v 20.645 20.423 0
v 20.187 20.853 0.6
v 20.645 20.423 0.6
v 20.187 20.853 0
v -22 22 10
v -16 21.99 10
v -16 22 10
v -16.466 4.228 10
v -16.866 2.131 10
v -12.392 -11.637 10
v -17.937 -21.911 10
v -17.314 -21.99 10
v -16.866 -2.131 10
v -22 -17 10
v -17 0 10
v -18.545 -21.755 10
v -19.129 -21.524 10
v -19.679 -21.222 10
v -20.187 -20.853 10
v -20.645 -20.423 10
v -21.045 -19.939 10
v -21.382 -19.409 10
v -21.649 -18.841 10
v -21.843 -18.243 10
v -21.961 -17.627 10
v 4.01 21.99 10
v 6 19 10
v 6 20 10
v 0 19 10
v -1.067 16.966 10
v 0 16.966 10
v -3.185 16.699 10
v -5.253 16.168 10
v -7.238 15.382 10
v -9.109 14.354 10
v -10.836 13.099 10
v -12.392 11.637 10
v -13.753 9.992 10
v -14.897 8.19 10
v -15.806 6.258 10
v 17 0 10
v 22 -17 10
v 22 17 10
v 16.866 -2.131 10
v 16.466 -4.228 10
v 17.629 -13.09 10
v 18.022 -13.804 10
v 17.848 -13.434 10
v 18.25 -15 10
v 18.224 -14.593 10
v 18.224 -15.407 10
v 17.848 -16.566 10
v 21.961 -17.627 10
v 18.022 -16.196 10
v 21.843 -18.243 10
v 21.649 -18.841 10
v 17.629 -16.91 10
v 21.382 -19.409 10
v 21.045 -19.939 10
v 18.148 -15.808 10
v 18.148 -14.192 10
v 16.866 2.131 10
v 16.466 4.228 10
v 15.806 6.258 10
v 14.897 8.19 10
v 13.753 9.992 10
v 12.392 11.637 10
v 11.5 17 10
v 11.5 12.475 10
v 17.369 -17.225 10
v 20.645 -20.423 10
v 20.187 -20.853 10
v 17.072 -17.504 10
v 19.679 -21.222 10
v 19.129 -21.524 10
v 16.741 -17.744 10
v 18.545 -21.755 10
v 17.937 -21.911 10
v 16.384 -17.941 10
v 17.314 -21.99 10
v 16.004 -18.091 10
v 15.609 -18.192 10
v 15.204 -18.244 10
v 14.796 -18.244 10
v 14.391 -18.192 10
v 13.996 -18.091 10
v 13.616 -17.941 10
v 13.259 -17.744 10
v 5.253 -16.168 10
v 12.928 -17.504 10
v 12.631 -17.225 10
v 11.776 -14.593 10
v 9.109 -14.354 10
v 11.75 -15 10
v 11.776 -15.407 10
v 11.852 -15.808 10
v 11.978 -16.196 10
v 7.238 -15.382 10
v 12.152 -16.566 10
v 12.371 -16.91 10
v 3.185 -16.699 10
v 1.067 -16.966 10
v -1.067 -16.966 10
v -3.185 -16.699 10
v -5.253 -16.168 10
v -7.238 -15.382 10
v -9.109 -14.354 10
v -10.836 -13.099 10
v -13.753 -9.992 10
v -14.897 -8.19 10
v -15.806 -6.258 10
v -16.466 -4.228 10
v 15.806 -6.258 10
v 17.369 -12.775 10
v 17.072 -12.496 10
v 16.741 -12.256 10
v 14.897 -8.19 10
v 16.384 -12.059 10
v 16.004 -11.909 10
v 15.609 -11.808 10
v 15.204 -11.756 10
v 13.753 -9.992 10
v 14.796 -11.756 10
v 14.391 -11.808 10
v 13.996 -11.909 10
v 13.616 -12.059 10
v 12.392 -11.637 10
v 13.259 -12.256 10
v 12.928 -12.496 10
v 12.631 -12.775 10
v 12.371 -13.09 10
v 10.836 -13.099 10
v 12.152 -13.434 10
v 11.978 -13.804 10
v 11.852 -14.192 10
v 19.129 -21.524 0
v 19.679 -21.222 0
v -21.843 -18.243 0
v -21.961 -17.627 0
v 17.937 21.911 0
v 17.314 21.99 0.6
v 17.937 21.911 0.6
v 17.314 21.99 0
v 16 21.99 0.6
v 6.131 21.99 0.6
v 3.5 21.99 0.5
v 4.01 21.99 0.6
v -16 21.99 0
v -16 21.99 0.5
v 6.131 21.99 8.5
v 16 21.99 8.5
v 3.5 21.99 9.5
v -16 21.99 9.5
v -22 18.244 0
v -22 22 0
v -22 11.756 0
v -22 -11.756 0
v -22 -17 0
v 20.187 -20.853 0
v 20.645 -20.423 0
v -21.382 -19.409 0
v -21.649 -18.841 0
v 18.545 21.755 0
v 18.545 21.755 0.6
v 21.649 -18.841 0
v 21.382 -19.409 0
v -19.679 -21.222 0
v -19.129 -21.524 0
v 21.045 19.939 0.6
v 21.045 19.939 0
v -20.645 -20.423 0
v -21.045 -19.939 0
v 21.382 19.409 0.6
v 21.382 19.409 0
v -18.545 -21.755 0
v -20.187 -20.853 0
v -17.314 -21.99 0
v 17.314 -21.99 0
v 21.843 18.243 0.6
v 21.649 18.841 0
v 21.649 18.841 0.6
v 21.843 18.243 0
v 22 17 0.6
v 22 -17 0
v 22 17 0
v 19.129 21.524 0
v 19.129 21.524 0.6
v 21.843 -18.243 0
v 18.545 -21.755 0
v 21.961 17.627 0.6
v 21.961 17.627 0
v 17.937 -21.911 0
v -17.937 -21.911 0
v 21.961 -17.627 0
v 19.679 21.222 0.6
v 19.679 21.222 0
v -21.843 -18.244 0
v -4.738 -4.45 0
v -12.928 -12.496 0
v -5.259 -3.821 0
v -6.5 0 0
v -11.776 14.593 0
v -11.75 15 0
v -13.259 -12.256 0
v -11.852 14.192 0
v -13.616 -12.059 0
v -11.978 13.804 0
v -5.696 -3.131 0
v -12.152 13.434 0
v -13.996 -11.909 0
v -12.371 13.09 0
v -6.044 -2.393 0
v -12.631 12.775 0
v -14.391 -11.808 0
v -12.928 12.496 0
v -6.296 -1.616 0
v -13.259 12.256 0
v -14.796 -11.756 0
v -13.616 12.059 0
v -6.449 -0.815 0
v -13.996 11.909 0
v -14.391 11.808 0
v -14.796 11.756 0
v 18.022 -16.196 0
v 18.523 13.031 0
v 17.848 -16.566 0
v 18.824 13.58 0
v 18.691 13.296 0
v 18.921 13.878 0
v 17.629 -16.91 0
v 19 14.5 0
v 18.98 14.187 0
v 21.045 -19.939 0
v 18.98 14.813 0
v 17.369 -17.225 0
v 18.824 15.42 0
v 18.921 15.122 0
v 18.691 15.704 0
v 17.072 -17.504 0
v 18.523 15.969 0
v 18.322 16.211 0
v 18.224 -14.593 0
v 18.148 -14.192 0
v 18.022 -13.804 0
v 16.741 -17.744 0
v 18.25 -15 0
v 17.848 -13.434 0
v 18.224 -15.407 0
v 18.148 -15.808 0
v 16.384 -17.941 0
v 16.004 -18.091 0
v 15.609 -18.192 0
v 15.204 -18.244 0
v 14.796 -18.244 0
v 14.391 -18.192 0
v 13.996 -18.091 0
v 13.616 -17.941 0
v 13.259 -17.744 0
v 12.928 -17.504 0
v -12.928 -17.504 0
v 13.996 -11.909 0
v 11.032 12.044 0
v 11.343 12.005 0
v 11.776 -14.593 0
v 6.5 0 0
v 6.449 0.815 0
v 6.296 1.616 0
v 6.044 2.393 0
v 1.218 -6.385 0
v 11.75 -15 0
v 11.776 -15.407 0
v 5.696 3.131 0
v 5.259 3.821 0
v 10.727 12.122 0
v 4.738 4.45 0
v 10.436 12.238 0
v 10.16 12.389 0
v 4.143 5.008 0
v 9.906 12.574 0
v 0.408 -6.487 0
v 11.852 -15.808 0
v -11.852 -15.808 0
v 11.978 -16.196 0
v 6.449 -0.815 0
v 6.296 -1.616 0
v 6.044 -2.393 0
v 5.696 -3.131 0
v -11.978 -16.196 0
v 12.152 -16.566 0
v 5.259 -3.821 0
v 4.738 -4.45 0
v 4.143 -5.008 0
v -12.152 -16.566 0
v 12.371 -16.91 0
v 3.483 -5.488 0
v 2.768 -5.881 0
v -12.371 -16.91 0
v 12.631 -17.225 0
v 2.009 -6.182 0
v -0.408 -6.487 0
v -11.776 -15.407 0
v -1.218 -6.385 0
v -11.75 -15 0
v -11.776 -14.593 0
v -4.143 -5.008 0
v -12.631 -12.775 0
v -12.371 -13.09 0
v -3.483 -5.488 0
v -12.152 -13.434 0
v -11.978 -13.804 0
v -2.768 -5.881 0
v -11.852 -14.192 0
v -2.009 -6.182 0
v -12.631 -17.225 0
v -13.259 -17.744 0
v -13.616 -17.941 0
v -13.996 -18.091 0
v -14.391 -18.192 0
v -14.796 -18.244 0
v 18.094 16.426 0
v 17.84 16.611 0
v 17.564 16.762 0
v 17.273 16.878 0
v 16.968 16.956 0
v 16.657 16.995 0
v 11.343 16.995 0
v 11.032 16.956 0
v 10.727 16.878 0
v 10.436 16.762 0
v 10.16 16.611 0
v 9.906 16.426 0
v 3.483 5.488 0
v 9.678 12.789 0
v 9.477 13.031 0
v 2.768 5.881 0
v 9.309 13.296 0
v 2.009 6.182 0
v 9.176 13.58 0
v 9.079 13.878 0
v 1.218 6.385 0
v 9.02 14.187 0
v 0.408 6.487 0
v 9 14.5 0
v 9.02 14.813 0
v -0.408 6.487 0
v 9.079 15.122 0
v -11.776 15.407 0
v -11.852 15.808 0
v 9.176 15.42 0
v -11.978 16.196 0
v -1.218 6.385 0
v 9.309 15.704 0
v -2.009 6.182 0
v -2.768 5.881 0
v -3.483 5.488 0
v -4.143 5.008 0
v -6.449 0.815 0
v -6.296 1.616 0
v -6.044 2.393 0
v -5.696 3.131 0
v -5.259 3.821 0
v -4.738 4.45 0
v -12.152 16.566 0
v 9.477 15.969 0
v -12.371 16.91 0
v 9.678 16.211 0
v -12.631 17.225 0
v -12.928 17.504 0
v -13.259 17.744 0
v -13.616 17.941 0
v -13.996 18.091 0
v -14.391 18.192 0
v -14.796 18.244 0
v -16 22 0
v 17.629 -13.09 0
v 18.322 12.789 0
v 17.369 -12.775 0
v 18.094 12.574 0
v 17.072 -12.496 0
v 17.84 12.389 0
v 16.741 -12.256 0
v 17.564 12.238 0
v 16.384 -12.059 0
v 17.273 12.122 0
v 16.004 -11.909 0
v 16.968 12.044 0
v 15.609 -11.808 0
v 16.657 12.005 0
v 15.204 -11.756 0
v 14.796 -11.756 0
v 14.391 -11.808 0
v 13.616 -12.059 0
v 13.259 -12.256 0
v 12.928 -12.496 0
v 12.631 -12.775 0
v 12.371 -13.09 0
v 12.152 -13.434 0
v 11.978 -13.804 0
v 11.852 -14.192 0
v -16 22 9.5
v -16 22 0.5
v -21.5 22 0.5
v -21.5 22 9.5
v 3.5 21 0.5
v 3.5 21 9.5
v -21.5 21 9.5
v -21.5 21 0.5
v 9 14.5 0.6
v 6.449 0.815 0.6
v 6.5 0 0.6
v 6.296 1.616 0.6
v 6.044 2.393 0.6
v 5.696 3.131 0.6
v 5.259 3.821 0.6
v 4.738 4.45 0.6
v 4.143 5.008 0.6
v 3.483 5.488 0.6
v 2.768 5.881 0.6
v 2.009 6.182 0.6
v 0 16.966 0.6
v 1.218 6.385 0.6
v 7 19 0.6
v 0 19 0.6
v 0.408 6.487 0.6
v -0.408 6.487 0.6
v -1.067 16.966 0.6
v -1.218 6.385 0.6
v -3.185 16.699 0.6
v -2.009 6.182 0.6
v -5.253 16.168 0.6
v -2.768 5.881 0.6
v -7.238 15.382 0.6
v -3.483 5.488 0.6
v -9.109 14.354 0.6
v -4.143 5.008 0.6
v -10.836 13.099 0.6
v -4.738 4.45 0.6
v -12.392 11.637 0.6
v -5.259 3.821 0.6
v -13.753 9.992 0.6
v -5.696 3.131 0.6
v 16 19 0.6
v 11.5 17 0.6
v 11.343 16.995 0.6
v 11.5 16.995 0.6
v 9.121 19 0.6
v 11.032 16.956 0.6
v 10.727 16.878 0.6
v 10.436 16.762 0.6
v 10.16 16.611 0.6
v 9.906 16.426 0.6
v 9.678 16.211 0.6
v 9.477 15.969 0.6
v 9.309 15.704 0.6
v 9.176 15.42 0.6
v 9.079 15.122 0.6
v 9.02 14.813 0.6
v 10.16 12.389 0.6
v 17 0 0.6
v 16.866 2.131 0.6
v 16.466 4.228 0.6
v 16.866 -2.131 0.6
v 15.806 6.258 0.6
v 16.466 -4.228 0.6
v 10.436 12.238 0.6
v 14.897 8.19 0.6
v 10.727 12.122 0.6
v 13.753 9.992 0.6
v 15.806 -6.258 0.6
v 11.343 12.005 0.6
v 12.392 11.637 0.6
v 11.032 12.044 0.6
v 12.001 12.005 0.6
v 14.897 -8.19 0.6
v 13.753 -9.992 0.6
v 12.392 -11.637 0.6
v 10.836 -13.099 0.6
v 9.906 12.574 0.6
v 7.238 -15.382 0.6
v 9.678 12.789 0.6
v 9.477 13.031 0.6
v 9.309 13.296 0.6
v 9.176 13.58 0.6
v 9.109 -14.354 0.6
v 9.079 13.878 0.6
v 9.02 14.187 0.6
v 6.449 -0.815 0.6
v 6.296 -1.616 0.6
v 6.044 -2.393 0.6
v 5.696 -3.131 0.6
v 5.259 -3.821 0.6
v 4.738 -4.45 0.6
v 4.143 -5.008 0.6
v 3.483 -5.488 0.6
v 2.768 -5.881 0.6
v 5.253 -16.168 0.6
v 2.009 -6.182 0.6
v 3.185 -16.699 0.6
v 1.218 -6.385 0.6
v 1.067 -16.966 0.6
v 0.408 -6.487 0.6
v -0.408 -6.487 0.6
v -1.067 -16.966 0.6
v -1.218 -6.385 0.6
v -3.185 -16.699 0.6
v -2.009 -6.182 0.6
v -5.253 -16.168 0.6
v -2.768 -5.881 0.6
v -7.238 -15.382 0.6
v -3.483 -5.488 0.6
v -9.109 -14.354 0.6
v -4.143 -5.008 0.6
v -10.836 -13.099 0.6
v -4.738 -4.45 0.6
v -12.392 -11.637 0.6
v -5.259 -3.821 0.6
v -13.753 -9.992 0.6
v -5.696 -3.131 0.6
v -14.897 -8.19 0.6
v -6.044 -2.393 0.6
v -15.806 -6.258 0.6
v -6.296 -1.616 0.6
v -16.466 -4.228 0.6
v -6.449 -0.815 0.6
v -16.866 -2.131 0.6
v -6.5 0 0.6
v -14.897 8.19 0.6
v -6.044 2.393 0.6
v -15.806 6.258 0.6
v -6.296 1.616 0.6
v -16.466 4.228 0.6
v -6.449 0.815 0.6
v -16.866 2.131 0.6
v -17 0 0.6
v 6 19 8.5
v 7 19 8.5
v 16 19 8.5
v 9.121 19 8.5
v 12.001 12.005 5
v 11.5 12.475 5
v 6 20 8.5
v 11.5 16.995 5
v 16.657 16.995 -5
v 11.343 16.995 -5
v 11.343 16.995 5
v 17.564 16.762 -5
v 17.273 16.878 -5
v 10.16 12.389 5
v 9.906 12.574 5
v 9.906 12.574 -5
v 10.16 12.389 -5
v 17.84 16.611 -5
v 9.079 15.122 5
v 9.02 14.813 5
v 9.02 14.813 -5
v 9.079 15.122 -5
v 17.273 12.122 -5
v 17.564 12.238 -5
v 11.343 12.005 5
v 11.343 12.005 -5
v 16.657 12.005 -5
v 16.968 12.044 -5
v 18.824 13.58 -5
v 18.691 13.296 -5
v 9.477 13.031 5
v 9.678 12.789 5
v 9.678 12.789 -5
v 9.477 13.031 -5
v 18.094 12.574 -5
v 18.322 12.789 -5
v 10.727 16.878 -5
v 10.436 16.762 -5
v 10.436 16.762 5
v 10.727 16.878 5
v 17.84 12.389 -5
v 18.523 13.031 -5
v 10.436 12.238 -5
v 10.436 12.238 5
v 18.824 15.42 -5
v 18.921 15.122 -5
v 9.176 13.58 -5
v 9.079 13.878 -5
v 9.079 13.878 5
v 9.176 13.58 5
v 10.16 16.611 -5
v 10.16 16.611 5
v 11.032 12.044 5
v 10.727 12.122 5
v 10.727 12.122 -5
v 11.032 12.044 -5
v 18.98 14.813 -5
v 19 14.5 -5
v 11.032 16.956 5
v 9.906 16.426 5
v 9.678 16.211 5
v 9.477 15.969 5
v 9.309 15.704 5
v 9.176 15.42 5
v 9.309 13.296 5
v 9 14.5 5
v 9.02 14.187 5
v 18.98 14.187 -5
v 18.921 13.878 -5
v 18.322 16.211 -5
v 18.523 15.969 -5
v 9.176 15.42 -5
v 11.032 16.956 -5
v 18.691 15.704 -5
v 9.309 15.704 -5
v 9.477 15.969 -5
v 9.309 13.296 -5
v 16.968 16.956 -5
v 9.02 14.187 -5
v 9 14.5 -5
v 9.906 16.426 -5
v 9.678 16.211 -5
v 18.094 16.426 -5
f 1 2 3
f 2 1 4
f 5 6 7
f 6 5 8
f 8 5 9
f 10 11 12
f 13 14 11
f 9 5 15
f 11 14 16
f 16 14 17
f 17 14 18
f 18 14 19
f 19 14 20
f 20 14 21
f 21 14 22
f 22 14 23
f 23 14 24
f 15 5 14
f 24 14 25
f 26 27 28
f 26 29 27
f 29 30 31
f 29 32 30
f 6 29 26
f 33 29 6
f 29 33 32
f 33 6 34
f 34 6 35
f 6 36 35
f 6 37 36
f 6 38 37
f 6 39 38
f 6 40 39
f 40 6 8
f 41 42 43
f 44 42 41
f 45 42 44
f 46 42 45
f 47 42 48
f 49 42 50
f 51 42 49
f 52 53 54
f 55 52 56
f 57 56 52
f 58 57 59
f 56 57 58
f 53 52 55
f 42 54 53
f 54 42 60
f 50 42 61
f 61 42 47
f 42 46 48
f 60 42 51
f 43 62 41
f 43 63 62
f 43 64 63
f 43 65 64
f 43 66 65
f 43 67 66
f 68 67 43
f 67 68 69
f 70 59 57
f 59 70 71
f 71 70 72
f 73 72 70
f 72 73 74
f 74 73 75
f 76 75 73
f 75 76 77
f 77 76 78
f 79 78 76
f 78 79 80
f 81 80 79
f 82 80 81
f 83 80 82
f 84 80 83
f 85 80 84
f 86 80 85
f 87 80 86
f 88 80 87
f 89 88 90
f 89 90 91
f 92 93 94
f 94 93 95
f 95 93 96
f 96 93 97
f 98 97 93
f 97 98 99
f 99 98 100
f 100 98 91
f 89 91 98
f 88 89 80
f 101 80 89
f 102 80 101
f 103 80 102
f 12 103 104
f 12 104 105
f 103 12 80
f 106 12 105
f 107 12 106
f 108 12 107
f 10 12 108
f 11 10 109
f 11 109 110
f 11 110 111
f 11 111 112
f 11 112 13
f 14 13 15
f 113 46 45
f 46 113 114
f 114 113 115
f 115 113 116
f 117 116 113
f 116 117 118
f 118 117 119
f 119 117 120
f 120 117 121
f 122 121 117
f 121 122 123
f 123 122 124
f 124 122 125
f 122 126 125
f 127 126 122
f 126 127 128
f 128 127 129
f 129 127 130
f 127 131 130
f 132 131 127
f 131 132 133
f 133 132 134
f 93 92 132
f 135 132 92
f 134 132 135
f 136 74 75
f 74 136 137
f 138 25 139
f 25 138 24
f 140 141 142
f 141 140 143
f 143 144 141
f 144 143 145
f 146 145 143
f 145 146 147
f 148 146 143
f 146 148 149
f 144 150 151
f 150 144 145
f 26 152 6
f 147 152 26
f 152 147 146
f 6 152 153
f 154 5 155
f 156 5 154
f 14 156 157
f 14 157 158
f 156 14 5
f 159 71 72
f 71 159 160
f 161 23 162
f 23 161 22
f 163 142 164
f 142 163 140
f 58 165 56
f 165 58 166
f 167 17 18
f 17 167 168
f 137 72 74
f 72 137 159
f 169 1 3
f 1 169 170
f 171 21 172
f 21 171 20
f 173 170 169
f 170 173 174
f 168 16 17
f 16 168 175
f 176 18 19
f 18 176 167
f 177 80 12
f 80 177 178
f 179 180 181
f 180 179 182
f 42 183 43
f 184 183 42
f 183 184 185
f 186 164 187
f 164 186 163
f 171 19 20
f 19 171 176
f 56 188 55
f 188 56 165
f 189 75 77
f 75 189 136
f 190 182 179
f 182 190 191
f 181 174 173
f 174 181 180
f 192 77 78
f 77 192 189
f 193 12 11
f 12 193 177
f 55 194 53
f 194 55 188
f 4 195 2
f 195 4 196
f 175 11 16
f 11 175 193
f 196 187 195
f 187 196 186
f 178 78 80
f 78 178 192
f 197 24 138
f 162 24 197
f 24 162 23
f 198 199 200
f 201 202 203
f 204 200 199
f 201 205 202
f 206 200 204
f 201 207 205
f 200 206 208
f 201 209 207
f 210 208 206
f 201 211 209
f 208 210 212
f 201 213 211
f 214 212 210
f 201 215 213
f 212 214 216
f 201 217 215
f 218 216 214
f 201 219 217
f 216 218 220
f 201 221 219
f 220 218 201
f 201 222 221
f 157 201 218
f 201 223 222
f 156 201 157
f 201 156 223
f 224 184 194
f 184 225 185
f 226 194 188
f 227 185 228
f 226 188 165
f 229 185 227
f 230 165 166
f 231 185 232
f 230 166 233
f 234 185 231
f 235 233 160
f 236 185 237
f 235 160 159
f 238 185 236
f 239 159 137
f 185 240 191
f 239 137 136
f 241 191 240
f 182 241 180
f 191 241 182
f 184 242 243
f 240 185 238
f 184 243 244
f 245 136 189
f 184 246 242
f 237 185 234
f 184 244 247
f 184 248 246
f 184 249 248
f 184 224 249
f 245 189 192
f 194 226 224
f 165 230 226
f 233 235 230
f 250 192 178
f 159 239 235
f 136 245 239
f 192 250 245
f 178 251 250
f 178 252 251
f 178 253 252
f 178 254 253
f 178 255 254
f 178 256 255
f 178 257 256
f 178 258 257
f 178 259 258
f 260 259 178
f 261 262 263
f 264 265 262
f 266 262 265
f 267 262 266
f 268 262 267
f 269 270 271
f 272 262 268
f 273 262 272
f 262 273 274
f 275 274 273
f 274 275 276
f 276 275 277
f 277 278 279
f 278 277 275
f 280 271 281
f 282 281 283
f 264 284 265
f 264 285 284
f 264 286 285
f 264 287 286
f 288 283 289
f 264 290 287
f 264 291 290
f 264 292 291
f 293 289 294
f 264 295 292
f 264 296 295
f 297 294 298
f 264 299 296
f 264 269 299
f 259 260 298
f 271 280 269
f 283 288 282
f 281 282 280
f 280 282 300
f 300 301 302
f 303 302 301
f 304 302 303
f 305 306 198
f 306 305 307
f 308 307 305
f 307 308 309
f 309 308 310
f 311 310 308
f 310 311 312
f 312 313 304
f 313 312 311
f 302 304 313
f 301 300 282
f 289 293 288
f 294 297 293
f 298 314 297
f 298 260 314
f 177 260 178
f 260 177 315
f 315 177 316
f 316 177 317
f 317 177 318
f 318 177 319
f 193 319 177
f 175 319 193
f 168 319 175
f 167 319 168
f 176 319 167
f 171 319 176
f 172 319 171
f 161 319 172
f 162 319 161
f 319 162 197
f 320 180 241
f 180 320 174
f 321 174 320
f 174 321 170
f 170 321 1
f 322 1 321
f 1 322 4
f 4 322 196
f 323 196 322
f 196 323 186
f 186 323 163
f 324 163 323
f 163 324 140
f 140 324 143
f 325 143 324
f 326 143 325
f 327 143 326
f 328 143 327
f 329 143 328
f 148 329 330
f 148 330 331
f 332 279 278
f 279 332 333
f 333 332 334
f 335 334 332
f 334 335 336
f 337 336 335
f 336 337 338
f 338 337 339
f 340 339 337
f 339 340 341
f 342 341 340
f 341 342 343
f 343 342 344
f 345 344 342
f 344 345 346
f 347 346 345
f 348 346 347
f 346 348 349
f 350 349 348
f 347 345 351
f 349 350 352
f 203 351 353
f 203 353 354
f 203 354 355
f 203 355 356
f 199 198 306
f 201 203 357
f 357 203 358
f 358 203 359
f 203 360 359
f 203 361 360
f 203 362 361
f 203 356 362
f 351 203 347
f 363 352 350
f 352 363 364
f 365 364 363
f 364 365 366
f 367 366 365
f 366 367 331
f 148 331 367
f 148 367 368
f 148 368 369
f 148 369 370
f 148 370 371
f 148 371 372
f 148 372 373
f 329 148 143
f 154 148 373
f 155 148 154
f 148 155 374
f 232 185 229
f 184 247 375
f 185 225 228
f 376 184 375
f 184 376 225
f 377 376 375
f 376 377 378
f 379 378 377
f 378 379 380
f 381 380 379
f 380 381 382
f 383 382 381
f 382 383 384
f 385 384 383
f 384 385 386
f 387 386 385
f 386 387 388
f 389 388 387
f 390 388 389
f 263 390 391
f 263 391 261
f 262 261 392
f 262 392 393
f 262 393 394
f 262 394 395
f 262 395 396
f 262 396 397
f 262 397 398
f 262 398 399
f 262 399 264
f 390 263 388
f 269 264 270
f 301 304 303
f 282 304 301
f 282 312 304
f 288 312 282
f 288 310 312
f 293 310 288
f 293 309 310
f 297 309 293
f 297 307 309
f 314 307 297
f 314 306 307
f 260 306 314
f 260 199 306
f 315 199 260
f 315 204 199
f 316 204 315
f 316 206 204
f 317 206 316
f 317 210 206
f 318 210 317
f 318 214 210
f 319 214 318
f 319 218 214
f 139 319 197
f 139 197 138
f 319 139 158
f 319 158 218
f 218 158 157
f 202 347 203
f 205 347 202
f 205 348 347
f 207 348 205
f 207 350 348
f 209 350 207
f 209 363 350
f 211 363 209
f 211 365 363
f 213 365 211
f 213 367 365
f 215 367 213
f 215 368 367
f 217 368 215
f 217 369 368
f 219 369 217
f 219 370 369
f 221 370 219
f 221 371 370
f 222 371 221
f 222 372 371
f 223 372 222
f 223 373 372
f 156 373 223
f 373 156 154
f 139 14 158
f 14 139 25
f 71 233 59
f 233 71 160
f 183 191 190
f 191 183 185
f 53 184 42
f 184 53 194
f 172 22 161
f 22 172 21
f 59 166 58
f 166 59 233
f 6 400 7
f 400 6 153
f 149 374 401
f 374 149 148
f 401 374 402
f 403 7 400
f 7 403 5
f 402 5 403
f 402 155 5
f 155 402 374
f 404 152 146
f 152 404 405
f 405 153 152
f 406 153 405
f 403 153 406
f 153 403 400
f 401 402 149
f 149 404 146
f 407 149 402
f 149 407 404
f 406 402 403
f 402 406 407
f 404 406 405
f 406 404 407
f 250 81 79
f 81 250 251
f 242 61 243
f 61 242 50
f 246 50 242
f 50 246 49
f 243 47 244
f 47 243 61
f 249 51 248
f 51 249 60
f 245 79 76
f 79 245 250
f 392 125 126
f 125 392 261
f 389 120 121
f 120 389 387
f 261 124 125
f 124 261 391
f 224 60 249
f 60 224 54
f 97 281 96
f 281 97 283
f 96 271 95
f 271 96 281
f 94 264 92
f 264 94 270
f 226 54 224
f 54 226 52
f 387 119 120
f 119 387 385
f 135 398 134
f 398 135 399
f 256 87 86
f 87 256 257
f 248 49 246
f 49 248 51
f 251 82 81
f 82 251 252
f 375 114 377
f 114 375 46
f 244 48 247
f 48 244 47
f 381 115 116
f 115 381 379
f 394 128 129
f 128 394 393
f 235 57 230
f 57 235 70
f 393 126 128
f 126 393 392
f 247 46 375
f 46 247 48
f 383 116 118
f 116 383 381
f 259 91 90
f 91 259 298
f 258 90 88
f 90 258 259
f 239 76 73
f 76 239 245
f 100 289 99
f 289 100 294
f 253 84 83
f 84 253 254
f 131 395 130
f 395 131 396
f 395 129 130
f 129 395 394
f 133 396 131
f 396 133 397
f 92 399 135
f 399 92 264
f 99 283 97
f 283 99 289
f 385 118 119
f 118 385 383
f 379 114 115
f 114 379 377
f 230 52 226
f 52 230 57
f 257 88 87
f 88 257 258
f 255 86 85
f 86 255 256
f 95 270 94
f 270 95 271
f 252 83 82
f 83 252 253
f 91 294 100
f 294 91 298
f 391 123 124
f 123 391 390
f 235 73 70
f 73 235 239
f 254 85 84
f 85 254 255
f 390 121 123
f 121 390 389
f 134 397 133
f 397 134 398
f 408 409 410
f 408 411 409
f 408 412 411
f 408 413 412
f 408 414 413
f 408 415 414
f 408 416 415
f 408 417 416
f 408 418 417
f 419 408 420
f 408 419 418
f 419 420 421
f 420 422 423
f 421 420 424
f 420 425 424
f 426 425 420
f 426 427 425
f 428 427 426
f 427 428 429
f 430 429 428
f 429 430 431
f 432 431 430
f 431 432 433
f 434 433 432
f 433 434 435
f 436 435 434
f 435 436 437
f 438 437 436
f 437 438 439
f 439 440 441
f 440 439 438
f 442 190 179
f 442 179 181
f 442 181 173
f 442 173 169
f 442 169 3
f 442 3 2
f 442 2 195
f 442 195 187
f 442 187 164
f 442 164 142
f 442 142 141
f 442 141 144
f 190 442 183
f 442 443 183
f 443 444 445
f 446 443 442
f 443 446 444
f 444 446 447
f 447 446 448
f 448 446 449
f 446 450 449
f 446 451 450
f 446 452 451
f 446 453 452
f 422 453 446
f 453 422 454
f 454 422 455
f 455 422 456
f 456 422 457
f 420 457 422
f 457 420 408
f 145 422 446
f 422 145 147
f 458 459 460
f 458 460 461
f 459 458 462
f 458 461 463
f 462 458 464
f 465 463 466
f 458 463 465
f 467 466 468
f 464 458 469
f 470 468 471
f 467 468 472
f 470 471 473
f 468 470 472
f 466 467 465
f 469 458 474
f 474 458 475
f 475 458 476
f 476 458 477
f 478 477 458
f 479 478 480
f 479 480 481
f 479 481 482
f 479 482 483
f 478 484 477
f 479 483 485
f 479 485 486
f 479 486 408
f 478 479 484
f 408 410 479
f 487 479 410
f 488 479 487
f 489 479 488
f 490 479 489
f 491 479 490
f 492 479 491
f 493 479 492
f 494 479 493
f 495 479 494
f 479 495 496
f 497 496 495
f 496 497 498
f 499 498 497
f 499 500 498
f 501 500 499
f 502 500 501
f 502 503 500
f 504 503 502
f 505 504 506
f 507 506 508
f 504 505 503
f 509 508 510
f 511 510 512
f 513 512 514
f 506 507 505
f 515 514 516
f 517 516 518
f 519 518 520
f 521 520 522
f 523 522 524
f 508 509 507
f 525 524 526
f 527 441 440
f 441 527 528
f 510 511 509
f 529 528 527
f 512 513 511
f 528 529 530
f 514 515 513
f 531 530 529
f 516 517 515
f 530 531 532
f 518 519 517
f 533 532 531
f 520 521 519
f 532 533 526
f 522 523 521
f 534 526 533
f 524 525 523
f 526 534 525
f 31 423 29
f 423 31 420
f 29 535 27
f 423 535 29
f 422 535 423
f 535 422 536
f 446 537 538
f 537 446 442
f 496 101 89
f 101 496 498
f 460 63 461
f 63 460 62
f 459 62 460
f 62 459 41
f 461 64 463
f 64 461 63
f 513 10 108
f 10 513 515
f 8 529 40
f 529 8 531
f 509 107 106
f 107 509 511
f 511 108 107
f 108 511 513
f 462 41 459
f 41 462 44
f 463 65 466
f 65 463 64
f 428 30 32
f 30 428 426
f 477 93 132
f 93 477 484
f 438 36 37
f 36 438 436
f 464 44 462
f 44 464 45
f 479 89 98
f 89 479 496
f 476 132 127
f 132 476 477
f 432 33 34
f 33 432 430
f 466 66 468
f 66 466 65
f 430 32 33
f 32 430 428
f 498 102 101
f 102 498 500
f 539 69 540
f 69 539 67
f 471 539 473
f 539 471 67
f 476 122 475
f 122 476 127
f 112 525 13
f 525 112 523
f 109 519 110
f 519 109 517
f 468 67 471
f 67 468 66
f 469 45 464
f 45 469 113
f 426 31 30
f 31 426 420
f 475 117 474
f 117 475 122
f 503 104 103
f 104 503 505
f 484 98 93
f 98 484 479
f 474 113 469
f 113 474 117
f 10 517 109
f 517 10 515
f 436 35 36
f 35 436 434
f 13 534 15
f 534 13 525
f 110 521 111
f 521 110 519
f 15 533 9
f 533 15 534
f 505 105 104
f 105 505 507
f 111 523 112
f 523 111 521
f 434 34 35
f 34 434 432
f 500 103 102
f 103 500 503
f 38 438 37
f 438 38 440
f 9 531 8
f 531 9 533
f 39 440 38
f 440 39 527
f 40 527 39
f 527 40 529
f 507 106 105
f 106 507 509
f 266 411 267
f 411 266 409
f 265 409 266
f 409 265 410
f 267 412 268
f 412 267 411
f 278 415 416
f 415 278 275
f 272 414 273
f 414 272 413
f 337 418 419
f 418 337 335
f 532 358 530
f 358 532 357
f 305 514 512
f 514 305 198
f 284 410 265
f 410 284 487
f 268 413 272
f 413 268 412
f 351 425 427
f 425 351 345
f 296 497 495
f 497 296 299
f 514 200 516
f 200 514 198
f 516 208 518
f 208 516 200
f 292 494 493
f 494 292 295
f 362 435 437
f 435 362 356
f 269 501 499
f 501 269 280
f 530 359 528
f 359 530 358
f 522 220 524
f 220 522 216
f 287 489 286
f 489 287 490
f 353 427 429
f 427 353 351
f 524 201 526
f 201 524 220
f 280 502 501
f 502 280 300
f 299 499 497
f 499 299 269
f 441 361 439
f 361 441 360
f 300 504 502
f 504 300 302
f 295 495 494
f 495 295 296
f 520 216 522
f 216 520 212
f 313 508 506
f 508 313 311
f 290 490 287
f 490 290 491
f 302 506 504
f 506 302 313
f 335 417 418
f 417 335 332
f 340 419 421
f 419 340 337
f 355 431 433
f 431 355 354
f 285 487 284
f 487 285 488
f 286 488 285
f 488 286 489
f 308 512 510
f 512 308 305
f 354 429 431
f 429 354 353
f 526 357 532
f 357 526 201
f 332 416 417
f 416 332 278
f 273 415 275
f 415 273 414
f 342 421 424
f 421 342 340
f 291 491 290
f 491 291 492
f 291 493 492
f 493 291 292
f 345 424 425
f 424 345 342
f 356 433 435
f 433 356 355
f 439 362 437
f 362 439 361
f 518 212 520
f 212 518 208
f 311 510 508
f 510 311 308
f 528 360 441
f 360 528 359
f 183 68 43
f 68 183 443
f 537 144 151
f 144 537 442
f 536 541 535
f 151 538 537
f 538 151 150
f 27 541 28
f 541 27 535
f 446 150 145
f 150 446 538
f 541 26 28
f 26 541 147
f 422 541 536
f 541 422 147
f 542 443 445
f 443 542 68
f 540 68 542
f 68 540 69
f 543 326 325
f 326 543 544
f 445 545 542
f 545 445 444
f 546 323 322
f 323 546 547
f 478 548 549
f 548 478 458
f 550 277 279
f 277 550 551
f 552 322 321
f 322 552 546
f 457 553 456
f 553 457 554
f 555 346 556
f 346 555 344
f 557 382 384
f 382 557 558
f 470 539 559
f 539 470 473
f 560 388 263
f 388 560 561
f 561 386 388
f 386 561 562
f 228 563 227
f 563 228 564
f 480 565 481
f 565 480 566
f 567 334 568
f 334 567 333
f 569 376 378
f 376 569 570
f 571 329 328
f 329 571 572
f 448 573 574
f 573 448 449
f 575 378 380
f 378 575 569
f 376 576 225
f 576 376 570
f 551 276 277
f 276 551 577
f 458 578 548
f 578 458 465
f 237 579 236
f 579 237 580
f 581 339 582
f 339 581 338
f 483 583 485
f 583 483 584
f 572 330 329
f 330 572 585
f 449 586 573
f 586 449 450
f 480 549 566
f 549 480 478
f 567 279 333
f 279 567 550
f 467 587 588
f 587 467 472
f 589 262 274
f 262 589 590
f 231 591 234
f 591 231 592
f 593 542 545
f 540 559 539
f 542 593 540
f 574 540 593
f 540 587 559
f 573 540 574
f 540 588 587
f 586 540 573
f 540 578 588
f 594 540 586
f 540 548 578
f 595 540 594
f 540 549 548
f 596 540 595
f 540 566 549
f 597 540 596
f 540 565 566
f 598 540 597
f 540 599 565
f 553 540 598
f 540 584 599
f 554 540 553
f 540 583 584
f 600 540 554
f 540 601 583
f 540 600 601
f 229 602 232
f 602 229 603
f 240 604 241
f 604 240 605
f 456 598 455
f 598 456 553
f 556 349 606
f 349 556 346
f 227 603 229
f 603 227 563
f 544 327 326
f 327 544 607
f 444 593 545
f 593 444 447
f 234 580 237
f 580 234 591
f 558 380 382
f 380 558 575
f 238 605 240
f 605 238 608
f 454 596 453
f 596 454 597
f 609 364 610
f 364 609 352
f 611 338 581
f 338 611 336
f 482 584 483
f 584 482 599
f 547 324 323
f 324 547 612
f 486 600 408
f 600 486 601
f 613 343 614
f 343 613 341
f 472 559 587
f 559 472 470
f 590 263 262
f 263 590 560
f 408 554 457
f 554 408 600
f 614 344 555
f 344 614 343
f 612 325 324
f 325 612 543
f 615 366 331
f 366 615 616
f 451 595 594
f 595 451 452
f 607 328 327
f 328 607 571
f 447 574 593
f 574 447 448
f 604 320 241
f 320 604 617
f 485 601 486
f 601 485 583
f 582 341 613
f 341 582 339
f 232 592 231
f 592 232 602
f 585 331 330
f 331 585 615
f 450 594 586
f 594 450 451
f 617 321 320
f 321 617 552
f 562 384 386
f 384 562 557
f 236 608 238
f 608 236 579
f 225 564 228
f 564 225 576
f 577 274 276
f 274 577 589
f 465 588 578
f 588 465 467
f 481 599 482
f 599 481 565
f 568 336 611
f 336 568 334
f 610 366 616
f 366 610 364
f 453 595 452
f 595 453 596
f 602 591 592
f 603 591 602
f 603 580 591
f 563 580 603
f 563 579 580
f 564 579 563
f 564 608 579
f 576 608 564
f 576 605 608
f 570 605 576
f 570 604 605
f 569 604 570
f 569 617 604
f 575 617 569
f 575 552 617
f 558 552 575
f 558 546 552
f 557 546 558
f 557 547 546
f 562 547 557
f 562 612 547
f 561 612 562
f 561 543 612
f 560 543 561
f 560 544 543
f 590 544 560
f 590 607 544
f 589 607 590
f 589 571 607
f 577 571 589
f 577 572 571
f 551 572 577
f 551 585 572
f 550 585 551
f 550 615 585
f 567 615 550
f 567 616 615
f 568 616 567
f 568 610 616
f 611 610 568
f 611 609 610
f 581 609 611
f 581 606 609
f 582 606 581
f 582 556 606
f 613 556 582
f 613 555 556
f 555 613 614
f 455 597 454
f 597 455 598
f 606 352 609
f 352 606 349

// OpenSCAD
$fn = 50;


union() {
	difference() {
		union() {
			hull() {
				translate(v = [-17.0000000000, 17.0000000000, 0]) {
					cylinder(h = 10, r = 5);
				}
				translate(v = [17.0000000000, 17.0000000000, 0]) {
					cylinder(h = 10, r = 5);
				}
				translate(v = [-17.0000000000, -17.0000000000, 0]) {
					cylinder(h = 10, r = 5);
				}
				translate(v = [17.0000000000, -17.0000000000, 0]) {
					cylinder(h = 10, r = 5);
				}
			}
			translate(v = [-22.0000000000, 16.0000000000, 0]) {
				cube(size = [6, 6, 10]);
			}
		}
		union() {
			translate(v = [-22.5000000000, -15.0000000000, -250.0000000000]) {
				rotate(a = [0, 0, 0]) {
					difference() {
						union() {
							hull() {
								translate(v = [7.5000000000, 0, 0]) {
									cylinder(h = 250, r = 3.2500000000, r1 = 3.2500000000, r2 = 3.2500000000);
								}
								translate(v = [-7.5000000000, 0, 0]) {
									cylinder(h = 250, r = 3.2500000000, r1 = 3.2500000000, r2 = 3.2500000000);
								}
							}
						}
						union();
					}
				}
			}
			translate(v = [-22.5000000000, 15.0000000000, -250.0000000000]) {
				rotate(a = [0, 0, 0]) {
					difference() {
						union() {
							hull() {
								translate(v = [7.5000000000, 0, 0]) {
									cylinder(h = 250, r = 3.2500000000, r1 = 3.2500000000, r2 = 3.2500000000);
								}
								translate(v = [-7.5000000000, 0, 0]) {
									cylinder(h = 250, r = 3.2500000000, r1 = 3.2500000000, r2 = 3.2500000000);
								}
							}
						}
						union();
					}
				}
			}
			translate(v = [-21.5000000000, 21.0000000000, 0.5000000000]) {
				cube(size = [25, 1, 9.0000000000]);
			}
			translate(v = [15.0000000000, -15.0000000000, 0]) {
				cylinder(h = 100, r = 3.2500000000);
			}
			translate(v = [0.0000000000, 11.0000000000, 0.6000000000]) {
				cube(size = [11, 8, 12.4000000000]);
			}
			translate(v = [0, 0, 0.6000000000]) {
				cylinder(h = 12.4000000000, r = 17.0000000000);
			}
			translate(v = [0, 0, -5.0000000000]) {
				cylinder(h = 10, r = 6.5000000000);
			}
			translate(v = [0.0000000000, 17.0000000000, 0.6000000000]) {
				cube(size = [22.0000000000, 2, 12.4000000000]);
			}
			translate(v = [16.0000000000, 17.0000000000, 0.6000000000]) {
				cube(size = [6, 5, 12.4000000000]);
			}
			translate(v = [6.0000000000, 17.0000000000, 8.5000000000]) {
				cube(size = [16, 5, 1.5000000000]);
			}
			translate(v = [3.2500000000, 22.7500000000, 0.6000000000]) {
				rotate(a = [0, 0, -45]) {
					cube(size = [7.5000000000, 1.5000000000, 12.4000000000]);
				}
			}
			translate(v = [2.5000000000, 12.0000000000, 0.6000000000]) {
				cube(size = [9.0000000000, 5, 9.4000000000]);
			}
		}
	}
	union() {
		translate(v = [14, 14.5000000000, -5.0000000000]) {
			rotate(a = [0, 0, 0]) {
				difference() {
					union() {
						#hull() {
							#translate(v = [2.5000000000, 0, 0]) {
								cylinder(h = 10, r = 2.5000000000, r1 = 2.5000000000, r2 = 2.5000000000);
							}
							#translate(v = [-2.5000000000, 0, 0]) {
								cylinder(h = 10, r = 2.5000000000, r1 = 2.5000000000, r2 = 2.5000000000);
							}
						}
					}
					union();
				}
			}
		}
	}
}
